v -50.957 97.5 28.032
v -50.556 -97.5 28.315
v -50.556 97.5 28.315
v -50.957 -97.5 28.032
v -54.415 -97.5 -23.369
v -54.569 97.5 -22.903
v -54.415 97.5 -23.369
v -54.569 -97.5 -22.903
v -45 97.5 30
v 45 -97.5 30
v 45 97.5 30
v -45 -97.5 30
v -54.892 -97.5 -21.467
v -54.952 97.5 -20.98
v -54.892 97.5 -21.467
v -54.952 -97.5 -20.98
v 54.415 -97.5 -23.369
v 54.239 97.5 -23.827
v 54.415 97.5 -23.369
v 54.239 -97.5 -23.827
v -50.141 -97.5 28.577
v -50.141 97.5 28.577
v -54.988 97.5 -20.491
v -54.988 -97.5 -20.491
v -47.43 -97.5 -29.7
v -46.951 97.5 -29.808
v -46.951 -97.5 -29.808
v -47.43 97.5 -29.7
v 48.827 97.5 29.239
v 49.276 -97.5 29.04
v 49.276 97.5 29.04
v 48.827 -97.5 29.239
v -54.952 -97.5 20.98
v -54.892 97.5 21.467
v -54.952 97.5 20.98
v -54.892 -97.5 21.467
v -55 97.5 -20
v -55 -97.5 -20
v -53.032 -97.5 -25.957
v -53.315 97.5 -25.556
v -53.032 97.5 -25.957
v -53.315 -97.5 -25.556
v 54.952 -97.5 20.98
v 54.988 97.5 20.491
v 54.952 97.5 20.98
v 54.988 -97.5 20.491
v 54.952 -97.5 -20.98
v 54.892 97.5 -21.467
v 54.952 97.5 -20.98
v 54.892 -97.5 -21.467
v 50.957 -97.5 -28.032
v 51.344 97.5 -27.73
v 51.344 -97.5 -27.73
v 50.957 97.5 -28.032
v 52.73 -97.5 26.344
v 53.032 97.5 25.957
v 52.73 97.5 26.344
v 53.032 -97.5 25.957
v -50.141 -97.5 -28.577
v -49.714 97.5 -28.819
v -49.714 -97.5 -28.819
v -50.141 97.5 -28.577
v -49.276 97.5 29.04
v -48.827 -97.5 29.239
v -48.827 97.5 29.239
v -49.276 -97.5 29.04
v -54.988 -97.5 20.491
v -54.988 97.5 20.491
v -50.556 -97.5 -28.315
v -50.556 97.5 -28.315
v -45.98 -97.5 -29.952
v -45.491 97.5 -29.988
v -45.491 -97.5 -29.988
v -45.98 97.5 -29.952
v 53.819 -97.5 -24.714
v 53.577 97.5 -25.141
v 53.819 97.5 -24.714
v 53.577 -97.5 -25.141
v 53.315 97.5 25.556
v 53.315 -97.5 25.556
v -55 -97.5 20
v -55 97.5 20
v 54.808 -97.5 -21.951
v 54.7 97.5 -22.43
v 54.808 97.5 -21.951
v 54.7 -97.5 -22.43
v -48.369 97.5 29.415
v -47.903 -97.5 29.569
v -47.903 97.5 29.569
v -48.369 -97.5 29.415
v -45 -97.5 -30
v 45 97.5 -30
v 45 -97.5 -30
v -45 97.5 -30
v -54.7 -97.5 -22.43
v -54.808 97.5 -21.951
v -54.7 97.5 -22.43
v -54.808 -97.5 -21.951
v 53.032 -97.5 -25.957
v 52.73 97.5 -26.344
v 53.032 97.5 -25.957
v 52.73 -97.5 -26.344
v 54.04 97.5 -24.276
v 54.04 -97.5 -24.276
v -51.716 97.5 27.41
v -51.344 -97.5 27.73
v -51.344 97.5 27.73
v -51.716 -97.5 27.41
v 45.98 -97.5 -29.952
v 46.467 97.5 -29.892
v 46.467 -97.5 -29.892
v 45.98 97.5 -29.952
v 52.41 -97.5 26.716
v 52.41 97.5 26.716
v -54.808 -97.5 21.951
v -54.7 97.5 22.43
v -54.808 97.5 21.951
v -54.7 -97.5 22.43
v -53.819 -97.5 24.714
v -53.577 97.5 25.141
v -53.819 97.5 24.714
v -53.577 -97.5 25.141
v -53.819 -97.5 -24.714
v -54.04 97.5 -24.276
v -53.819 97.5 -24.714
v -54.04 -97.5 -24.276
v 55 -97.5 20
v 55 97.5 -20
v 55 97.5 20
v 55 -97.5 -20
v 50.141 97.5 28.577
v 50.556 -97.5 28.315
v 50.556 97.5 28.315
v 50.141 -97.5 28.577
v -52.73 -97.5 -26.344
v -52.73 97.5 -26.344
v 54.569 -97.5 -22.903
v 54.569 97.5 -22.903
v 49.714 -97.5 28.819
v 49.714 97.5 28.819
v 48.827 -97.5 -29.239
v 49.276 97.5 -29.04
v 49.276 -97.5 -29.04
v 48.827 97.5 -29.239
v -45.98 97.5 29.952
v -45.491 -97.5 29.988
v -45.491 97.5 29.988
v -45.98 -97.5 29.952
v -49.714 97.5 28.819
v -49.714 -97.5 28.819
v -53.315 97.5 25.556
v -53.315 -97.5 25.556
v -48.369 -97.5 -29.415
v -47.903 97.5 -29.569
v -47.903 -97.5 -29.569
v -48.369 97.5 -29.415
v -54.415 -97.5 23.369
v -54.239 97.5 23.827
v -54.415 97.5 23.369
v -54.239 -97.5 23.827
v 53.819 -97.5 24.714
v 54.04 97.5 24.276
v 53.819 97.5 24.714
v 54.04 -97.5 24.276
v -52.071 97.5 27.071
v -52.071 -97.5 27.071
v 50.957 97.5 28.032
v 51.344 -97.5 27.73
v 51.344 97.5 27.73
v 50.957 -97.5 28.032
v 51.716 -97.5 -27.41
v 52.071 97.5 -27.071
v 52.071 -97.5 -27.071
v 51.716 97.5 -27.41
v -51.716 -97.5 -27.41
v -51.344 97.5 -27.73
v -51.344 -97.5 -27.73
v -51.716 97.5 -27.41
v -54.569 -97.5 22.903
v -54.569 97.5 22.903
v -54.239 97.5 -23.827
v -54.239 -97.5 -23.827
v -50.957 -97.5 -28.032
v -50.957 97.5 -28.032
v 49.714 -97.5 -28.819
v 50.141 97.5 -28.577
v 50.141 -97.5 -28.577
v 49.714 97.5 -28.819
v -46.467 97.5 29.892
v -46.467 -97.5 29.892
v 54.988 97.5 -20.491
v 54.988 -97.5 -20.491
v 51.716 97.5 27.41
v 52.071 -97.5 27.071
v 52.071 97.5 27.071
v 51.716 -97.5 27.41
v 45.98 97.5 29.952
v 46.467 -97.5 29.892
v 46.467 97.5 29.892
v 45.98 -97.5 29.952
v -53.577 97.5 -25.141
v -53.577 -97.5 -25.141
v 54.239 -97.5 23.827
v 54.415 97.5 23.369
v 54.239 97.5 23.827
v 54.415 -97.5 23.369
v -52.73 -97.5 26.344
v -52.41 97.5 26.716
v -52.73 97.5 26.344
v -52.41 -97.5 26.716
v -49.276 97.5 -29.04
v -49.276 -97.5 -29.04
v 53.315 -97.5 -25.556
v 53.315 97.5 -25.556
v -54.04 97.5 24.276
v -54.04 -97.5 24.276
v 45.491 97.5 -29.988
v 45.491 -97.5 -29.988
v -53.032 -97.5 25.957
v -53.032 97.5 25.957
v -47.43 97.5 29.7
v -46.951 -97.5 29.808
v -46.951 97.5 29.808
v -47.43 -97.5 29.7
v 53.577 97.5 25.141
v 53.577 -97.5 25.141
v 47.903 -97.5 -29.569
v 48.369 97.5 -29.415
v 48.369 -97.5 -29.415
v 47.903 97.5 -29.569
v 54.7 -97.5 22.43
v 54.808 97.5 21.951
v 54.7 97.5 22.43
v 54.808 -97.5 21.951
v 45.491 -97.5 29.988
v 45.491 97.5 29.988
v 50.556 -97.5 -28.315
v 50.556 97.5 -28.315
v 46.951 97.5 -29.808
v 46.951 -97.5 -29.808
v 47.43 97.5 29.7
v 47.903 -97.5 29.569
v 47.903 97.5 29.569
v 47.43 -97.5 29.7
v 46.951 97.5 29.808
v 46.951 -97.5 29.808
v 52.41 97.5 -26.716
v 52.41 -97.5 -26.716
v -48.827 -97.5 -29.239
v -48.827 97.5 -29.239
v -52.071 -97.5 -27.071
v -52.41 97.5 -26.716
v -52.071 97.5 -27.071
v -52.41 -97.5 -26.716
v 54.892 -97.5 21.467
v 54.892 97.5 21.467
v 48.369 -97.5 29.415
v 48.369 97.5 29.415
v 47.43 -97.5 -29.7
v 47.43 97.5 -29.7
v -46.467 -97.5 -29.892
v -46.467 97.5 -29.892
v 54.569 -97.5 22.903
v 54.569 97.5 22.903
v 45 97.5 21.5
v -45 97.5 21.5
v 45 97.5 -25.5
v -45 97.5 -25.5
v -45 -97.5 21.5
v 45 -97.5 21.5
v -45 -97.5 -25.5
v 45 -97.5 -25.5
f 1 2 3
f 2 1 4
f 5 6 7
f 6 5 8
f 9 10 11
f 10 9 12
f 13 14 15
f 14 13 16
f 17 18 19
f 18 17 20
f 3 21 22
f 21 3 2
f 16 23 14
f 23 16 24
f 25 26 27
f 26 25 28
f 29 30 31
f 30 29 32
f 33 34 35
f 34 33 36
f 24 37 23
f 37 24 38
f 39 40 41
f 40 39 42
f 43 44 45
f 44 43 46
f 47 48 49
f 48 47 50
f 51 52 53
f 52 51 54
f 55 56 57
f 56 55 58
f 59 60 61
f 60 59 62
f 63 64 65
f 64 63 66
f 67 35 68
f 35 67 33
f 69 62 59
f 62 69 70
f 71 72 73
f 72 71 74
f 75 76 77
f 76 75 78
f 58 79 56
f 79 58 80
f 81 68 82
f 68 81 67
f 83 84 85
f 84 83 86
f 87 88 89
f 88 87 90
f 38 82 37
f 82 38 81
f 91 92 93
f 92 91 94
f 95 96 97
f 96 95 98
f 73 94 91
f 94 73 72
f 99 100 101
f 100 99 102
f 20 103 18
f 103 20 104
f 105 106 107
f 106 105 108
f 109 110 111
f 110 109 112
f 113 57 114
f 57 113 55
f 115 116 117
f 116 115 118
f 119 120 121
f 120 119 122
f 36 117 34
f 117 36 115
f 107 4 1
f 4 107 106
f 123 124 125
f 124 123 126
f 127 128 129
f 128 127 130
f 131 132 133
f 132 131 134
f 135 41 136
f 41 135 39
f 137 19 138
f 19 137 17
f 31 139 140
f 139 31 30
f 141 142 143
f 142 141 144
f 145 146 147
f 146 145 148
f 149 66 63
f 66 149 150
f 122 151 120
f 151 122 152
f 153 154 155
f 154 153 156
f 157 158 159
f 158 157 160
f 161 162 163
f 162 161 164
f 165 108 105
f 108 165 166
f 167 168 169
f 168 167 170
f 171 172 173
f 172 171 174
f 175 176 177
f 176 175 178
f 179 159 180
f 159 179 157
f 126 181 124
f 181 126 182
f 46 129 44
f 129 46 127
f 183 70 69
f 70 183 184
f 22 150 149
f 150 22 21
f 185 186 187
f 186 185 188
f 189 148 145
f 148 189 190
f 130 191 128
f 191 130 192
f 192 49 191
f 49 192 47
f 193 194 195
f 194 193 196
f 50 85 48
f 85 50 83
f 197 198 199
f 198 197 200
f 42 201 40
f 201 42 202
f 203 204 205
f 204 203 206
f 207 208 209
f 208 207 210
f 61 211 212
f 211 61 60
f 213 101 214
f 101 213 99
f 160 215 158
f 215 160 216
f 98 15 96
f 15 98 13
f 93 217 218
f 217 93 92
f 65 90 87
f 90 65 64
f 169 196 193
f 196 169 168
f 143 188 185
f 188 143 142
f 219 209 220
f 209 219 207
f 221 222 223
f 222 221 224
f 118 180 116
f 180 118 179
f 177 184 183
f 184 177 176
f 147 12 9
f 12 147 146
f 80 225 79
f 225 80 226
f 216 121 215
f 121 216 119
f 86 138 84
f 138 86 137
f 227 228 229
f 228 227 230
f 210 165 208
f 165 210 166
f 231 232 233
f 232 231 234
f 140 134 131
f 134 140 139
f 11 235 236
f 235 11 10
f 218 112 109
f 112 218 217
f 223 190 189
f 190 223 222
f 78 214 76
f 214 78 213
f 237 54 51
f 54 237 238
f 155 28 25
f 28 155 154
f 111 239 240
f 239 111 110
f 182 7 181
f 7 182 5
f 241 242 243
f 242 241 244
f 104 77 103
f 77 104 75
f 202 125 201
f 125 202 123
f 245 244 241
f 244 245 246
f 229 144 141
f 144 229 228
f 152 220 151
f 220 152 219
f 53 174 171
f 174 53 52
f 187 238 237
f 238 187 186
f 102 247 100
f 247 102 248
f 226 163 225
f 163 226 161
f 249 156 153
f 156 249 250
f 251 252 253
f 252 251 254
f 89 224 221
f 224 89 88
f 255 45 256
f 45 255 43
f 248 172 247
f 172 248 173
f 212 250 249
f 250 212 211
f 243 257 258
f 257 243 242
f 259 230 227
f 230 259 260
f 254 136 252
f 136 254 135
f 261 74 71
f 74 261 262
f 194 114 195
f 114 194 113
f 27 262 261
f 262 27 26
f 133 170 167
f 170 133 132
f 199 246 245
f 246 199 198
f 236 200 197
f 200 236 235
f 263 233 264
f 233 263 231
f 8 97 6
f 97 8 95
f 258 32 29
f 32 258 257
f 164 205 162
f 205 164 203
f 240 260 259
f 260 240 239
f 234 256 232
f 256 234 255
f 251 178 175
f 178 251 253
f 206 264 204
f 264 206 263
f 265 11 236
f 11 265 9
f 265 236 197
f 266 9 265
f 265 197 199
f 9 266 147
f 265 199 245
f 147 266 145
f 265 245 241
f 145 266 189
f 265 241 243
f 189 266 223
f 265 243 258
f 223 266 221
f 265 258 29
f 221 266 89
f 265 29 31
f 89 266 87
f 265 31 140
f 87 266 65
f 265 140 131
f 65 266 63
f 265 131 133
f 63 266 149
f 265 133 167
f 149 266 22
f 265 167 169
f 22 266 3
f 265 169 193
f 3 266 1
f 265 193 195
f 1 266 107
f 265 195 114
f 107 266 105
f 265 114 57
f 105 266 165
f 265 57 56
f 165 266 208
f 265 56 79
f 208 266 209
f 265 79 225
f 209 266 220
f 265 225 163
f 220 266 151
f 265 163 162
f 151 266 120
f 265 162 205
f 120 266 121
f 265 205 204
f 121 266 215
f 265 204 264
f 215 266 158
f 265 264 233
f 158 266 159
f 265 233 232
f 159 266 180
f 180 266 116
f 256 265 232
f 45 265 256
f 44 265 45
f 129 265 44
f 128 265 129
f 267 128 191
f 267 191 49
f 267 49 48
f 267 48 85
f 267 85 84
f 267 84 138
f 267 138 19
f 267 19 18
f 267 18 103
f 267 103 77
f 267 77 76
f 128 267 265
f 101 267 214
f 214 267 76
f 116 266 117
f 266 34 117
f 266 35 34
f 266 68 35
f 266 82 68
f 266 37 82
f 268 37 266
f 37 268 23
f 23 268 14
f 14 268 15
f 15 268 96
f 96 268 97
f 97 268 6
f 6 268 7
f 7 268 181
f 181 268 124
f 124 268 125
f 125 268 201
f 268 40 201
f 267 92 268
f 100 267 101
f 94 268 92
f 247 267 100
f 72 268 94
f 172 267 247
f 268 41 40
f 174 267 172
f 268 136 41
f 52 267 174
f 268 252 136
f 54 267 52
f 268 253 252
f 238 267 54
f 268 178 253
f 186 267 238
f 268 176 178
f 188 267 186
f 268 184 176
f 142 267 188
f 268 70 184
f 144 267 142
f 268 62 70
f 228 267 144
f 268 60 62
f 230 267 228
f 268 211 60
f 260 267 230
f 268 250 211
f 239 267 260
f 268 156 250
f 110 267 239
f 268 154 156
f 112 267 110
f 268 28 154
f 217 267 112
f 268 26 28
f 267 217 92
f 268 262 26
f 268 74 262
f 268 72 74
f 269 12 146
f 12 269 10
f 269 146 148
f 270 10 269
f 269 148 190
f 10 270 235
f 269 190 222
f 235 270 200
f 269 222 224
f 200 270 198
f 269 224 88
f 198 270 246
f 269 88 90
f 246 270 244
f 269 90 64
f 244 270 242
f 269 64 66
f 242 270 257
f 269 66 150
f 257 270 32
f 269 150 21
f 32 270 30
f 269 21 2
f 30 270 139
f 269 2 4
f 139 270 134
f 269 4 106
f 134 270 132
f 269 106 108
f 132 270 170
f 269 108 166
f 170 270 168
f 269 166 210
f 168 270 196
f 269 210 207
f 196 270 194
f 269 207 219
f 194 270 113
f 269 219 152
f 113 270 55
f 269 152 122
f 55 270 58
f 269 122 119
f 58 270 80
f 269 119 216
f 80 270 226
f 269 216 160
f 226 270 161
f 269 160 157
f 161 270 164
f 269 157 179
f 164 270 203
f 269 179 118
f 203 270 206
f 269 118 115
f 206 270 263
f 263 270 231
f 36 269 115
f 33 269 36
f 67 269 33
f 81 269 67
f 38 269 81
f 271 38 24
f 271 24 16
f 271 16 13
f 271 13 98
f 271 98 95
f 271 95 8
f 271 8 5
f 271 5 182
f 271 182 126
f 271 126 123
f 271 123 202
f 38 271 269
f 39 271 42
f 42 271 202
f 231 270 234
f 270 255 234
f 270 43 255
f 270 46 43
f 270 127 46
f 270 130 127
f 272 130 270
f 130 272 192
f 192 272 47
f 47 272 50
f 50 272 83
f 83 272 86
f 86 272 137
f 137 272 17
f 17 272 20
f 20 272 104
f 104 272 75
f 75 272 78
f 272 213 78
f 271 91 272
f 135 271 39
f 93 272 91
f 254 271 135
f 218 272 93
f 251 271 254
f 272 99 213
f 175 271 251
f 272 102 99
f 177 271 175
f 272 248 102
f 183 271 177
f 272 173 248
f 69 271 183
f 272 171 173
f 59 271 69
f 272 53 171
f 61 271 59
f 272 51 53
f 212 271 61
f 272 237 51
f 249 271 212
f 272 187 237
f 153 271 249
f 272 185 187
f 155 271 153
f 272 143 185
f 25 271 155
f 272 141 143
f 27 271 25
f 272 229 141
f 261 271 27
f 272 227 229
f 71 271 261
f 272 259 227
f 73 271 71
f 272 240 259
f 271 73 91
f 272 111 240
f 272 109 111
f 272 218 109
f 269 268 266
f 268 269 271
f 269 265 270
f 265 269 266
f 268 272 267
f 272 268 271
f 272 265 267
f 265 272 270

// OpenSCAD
// test for screw tolerances


$fn = 128;
outerD = 4.65;

innerD = 2.95;

*difference() {
    cube(size=[10,50,10]);
    union() {
        translate(v=[5,10,-1])
        cylinder(h=30,r=innerD/2-0.2);
        
        translate(v=[5,25,-1])
        cylinder(h=30,r=innerD/2);
        
        translate(v=[5,40,-1])
        cylinder(h=30,r=innerD/2+0.2);
    }
}


module caseOuter() {
    rotate(a=[90,0,0])
    minkowski() {
        cube(size=[90,40,195], center=true);
        cylinder(h=0.00000000001, r=10);
    }
}

module caseInner() {
    translate(v=[0,0,-2])
    rotate(a=[90,0,0])
    minkowski() {
        cube(size=[90,47,195+0.01], center=true);
        *cylinder(h=0.00000000001, r=5);
    }
}

module caseShell() {
    difference() {
        caseOuter();
        caseInner();
    }
}





caseShell();
